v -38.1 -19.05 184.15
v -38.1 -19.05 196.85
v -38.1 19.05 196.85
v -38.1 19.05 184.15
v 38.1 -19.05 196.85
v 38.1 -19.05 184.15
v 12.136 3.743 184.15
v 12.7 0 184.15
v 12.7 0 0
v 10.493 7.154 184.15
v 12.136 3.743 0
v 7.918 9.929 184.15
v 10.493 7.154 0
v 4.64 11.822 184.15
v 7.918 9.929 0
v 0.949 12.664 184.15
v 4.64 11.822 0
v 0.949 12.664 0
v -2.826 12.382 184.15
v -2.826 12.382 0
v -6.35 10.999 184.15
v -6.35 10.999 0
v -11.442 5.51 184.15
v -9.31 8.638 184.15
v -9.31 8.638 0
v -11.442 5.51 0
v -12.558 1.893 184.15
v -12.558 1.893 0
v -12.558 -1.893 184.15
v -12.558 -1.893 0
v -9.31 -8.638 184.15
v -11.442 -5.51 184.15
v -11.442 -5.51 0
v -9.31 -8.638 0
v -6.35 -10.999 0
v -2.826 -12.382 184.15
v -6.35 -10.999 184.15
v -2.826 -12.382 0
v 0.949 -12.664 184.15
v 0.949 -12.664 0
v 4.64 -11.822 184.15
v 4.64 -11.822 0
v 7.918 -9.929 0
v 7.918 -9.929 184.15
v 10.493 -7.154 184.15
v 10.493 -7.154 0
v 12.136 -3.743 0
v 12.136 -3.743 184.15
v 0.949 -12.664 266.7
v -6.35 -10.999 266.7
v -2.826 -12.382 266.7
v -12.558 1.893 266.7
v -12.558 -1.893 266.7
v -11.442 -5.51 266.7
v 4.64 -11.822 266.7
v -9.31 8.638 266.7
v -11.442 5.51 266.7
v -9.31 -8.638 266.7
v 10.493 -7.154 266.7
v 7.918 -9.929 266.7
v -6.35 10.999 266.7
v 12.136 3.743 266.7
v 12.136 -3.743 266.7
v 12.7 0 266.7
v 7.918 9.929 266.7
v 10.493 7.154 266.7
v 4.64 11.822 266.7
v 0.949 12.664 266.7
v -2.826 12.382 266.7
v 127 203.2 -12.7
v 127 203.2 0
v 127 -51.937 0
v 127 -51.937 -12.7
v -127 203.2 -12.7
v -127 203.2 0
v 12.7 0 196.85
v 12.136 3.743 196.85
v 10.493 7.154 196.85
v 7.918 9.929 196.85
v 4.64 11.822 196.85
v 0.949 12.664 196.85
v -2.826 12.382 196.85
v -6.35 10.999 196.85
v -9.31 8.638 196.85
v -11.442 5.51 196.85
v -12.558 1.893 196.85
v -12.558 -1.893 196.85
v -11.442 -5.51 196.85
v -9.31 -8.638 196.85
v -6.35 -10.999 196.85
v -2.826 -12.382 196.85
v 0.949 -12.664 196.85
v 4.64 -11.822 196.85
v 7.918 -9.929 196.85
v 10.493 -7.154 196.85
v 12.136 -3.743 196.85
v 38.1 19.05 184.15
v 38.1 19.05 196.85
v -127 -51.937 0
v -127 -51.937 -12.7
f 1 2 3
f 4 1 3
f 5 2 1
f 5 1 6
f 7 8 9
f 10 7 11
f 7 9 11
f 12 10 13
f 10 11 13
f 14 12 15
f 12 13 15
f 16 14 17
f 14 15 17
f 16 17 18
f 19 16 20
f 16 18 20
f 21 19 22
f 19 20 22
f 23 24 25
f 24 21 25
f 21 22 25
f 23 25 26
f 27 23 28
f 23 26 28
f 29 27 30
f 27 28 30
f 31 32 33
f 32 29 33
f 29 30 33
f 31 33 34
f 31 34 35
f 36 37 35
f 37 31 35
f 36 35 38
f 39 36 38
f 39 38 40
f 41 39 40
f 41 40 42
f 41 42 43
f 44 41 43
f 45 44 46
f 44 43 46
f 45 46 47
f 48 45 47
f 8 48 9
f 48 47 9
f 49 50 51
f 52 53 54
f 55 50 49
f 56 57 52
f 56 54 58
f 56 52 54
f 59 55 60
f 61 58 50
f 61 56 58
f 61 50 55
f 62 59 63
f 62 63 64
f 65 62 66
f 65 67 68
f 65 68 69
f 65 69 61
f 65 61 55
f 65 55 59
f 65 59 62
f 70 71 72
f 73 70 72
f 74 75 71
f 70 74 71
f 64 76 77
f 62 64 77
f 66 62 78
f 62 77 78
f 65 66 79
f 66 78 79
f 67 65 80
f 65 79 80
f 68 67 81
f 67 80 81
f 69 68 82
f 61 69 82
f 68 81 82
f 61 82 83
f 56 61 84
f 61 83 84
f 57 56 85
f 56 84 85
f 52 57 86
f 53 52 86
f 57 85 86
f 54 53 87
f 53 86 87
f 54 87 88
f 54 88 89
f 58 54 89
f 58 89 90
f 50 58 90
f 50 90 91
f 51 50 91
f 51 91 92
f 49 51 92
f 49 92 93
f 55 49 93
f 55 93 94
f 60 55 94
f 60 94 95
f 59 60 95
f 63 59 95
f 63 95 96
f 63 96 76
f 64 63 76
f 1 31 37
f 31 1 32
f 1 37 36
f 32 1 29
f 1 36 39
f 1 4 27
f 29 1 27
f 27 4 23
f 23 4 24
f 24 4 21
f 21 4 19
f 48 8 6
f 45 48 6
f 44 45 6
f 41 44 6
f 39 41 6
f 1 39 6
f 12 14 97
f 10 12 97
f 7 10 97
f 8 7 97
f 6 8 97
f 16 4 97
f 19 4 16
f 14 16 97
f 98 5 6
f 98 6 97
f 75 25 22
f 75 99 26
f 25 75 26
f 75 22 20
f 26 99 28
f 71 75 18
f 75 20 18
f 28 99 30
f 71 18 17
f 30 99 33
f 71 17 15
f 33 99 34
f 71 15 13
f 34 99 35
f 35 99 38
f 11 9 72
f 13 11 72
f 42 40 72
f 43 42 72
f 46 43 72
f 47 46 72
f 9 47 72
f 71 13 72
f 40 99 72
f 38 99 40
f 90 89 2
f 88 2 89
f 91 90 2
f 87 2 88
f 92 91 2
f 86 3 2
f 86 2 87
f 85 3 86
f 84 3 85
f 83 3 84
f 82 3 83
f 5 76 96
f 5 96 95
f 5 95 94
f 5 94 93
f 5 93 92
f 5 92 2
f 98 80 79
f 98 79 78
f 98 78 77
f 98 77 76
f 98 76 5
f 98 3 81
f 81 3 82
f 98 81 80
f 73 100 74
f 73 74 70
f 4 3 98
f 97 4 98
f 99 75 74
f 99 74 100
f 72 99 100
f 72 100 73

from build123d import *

# Parameters (mm, degrees)
F0_R     = 12.7
F1_DEPTH = 266.7
F3_W     = 76.2
F3_H     = 38.1
F4_DEPTH = 12.7
F5_W     = 254
F5_H     = 255.137313
F6_DEPTH = 12.7


with BuildPart() as f1:
    # F0 (on Top) → F1 (new body)
    with BuildSketch(Plane.XY):
        Circle(F0_R)
    extrude(amount=F1_DEPTH)

    # F3 (on offset) → F4 (join)
    with BuildSketch(Plane.XY.offset(196.85)):
        Rectangle(F3_W, F3_H)
    extrude(amount=-F4_DEPTH)

    # F5 (on face) → F6 (join)
    with BuildSketch(Plane(origin=(0, 0, 0), x_dir=(1, 0, 0), z_dir=(0, 0, -1))):
        with Locations((0, -75.631343)):
            Rectangle(F5_W, F5_H)
    extrude(amount=F6_DEPTH)


solid = f1.part
